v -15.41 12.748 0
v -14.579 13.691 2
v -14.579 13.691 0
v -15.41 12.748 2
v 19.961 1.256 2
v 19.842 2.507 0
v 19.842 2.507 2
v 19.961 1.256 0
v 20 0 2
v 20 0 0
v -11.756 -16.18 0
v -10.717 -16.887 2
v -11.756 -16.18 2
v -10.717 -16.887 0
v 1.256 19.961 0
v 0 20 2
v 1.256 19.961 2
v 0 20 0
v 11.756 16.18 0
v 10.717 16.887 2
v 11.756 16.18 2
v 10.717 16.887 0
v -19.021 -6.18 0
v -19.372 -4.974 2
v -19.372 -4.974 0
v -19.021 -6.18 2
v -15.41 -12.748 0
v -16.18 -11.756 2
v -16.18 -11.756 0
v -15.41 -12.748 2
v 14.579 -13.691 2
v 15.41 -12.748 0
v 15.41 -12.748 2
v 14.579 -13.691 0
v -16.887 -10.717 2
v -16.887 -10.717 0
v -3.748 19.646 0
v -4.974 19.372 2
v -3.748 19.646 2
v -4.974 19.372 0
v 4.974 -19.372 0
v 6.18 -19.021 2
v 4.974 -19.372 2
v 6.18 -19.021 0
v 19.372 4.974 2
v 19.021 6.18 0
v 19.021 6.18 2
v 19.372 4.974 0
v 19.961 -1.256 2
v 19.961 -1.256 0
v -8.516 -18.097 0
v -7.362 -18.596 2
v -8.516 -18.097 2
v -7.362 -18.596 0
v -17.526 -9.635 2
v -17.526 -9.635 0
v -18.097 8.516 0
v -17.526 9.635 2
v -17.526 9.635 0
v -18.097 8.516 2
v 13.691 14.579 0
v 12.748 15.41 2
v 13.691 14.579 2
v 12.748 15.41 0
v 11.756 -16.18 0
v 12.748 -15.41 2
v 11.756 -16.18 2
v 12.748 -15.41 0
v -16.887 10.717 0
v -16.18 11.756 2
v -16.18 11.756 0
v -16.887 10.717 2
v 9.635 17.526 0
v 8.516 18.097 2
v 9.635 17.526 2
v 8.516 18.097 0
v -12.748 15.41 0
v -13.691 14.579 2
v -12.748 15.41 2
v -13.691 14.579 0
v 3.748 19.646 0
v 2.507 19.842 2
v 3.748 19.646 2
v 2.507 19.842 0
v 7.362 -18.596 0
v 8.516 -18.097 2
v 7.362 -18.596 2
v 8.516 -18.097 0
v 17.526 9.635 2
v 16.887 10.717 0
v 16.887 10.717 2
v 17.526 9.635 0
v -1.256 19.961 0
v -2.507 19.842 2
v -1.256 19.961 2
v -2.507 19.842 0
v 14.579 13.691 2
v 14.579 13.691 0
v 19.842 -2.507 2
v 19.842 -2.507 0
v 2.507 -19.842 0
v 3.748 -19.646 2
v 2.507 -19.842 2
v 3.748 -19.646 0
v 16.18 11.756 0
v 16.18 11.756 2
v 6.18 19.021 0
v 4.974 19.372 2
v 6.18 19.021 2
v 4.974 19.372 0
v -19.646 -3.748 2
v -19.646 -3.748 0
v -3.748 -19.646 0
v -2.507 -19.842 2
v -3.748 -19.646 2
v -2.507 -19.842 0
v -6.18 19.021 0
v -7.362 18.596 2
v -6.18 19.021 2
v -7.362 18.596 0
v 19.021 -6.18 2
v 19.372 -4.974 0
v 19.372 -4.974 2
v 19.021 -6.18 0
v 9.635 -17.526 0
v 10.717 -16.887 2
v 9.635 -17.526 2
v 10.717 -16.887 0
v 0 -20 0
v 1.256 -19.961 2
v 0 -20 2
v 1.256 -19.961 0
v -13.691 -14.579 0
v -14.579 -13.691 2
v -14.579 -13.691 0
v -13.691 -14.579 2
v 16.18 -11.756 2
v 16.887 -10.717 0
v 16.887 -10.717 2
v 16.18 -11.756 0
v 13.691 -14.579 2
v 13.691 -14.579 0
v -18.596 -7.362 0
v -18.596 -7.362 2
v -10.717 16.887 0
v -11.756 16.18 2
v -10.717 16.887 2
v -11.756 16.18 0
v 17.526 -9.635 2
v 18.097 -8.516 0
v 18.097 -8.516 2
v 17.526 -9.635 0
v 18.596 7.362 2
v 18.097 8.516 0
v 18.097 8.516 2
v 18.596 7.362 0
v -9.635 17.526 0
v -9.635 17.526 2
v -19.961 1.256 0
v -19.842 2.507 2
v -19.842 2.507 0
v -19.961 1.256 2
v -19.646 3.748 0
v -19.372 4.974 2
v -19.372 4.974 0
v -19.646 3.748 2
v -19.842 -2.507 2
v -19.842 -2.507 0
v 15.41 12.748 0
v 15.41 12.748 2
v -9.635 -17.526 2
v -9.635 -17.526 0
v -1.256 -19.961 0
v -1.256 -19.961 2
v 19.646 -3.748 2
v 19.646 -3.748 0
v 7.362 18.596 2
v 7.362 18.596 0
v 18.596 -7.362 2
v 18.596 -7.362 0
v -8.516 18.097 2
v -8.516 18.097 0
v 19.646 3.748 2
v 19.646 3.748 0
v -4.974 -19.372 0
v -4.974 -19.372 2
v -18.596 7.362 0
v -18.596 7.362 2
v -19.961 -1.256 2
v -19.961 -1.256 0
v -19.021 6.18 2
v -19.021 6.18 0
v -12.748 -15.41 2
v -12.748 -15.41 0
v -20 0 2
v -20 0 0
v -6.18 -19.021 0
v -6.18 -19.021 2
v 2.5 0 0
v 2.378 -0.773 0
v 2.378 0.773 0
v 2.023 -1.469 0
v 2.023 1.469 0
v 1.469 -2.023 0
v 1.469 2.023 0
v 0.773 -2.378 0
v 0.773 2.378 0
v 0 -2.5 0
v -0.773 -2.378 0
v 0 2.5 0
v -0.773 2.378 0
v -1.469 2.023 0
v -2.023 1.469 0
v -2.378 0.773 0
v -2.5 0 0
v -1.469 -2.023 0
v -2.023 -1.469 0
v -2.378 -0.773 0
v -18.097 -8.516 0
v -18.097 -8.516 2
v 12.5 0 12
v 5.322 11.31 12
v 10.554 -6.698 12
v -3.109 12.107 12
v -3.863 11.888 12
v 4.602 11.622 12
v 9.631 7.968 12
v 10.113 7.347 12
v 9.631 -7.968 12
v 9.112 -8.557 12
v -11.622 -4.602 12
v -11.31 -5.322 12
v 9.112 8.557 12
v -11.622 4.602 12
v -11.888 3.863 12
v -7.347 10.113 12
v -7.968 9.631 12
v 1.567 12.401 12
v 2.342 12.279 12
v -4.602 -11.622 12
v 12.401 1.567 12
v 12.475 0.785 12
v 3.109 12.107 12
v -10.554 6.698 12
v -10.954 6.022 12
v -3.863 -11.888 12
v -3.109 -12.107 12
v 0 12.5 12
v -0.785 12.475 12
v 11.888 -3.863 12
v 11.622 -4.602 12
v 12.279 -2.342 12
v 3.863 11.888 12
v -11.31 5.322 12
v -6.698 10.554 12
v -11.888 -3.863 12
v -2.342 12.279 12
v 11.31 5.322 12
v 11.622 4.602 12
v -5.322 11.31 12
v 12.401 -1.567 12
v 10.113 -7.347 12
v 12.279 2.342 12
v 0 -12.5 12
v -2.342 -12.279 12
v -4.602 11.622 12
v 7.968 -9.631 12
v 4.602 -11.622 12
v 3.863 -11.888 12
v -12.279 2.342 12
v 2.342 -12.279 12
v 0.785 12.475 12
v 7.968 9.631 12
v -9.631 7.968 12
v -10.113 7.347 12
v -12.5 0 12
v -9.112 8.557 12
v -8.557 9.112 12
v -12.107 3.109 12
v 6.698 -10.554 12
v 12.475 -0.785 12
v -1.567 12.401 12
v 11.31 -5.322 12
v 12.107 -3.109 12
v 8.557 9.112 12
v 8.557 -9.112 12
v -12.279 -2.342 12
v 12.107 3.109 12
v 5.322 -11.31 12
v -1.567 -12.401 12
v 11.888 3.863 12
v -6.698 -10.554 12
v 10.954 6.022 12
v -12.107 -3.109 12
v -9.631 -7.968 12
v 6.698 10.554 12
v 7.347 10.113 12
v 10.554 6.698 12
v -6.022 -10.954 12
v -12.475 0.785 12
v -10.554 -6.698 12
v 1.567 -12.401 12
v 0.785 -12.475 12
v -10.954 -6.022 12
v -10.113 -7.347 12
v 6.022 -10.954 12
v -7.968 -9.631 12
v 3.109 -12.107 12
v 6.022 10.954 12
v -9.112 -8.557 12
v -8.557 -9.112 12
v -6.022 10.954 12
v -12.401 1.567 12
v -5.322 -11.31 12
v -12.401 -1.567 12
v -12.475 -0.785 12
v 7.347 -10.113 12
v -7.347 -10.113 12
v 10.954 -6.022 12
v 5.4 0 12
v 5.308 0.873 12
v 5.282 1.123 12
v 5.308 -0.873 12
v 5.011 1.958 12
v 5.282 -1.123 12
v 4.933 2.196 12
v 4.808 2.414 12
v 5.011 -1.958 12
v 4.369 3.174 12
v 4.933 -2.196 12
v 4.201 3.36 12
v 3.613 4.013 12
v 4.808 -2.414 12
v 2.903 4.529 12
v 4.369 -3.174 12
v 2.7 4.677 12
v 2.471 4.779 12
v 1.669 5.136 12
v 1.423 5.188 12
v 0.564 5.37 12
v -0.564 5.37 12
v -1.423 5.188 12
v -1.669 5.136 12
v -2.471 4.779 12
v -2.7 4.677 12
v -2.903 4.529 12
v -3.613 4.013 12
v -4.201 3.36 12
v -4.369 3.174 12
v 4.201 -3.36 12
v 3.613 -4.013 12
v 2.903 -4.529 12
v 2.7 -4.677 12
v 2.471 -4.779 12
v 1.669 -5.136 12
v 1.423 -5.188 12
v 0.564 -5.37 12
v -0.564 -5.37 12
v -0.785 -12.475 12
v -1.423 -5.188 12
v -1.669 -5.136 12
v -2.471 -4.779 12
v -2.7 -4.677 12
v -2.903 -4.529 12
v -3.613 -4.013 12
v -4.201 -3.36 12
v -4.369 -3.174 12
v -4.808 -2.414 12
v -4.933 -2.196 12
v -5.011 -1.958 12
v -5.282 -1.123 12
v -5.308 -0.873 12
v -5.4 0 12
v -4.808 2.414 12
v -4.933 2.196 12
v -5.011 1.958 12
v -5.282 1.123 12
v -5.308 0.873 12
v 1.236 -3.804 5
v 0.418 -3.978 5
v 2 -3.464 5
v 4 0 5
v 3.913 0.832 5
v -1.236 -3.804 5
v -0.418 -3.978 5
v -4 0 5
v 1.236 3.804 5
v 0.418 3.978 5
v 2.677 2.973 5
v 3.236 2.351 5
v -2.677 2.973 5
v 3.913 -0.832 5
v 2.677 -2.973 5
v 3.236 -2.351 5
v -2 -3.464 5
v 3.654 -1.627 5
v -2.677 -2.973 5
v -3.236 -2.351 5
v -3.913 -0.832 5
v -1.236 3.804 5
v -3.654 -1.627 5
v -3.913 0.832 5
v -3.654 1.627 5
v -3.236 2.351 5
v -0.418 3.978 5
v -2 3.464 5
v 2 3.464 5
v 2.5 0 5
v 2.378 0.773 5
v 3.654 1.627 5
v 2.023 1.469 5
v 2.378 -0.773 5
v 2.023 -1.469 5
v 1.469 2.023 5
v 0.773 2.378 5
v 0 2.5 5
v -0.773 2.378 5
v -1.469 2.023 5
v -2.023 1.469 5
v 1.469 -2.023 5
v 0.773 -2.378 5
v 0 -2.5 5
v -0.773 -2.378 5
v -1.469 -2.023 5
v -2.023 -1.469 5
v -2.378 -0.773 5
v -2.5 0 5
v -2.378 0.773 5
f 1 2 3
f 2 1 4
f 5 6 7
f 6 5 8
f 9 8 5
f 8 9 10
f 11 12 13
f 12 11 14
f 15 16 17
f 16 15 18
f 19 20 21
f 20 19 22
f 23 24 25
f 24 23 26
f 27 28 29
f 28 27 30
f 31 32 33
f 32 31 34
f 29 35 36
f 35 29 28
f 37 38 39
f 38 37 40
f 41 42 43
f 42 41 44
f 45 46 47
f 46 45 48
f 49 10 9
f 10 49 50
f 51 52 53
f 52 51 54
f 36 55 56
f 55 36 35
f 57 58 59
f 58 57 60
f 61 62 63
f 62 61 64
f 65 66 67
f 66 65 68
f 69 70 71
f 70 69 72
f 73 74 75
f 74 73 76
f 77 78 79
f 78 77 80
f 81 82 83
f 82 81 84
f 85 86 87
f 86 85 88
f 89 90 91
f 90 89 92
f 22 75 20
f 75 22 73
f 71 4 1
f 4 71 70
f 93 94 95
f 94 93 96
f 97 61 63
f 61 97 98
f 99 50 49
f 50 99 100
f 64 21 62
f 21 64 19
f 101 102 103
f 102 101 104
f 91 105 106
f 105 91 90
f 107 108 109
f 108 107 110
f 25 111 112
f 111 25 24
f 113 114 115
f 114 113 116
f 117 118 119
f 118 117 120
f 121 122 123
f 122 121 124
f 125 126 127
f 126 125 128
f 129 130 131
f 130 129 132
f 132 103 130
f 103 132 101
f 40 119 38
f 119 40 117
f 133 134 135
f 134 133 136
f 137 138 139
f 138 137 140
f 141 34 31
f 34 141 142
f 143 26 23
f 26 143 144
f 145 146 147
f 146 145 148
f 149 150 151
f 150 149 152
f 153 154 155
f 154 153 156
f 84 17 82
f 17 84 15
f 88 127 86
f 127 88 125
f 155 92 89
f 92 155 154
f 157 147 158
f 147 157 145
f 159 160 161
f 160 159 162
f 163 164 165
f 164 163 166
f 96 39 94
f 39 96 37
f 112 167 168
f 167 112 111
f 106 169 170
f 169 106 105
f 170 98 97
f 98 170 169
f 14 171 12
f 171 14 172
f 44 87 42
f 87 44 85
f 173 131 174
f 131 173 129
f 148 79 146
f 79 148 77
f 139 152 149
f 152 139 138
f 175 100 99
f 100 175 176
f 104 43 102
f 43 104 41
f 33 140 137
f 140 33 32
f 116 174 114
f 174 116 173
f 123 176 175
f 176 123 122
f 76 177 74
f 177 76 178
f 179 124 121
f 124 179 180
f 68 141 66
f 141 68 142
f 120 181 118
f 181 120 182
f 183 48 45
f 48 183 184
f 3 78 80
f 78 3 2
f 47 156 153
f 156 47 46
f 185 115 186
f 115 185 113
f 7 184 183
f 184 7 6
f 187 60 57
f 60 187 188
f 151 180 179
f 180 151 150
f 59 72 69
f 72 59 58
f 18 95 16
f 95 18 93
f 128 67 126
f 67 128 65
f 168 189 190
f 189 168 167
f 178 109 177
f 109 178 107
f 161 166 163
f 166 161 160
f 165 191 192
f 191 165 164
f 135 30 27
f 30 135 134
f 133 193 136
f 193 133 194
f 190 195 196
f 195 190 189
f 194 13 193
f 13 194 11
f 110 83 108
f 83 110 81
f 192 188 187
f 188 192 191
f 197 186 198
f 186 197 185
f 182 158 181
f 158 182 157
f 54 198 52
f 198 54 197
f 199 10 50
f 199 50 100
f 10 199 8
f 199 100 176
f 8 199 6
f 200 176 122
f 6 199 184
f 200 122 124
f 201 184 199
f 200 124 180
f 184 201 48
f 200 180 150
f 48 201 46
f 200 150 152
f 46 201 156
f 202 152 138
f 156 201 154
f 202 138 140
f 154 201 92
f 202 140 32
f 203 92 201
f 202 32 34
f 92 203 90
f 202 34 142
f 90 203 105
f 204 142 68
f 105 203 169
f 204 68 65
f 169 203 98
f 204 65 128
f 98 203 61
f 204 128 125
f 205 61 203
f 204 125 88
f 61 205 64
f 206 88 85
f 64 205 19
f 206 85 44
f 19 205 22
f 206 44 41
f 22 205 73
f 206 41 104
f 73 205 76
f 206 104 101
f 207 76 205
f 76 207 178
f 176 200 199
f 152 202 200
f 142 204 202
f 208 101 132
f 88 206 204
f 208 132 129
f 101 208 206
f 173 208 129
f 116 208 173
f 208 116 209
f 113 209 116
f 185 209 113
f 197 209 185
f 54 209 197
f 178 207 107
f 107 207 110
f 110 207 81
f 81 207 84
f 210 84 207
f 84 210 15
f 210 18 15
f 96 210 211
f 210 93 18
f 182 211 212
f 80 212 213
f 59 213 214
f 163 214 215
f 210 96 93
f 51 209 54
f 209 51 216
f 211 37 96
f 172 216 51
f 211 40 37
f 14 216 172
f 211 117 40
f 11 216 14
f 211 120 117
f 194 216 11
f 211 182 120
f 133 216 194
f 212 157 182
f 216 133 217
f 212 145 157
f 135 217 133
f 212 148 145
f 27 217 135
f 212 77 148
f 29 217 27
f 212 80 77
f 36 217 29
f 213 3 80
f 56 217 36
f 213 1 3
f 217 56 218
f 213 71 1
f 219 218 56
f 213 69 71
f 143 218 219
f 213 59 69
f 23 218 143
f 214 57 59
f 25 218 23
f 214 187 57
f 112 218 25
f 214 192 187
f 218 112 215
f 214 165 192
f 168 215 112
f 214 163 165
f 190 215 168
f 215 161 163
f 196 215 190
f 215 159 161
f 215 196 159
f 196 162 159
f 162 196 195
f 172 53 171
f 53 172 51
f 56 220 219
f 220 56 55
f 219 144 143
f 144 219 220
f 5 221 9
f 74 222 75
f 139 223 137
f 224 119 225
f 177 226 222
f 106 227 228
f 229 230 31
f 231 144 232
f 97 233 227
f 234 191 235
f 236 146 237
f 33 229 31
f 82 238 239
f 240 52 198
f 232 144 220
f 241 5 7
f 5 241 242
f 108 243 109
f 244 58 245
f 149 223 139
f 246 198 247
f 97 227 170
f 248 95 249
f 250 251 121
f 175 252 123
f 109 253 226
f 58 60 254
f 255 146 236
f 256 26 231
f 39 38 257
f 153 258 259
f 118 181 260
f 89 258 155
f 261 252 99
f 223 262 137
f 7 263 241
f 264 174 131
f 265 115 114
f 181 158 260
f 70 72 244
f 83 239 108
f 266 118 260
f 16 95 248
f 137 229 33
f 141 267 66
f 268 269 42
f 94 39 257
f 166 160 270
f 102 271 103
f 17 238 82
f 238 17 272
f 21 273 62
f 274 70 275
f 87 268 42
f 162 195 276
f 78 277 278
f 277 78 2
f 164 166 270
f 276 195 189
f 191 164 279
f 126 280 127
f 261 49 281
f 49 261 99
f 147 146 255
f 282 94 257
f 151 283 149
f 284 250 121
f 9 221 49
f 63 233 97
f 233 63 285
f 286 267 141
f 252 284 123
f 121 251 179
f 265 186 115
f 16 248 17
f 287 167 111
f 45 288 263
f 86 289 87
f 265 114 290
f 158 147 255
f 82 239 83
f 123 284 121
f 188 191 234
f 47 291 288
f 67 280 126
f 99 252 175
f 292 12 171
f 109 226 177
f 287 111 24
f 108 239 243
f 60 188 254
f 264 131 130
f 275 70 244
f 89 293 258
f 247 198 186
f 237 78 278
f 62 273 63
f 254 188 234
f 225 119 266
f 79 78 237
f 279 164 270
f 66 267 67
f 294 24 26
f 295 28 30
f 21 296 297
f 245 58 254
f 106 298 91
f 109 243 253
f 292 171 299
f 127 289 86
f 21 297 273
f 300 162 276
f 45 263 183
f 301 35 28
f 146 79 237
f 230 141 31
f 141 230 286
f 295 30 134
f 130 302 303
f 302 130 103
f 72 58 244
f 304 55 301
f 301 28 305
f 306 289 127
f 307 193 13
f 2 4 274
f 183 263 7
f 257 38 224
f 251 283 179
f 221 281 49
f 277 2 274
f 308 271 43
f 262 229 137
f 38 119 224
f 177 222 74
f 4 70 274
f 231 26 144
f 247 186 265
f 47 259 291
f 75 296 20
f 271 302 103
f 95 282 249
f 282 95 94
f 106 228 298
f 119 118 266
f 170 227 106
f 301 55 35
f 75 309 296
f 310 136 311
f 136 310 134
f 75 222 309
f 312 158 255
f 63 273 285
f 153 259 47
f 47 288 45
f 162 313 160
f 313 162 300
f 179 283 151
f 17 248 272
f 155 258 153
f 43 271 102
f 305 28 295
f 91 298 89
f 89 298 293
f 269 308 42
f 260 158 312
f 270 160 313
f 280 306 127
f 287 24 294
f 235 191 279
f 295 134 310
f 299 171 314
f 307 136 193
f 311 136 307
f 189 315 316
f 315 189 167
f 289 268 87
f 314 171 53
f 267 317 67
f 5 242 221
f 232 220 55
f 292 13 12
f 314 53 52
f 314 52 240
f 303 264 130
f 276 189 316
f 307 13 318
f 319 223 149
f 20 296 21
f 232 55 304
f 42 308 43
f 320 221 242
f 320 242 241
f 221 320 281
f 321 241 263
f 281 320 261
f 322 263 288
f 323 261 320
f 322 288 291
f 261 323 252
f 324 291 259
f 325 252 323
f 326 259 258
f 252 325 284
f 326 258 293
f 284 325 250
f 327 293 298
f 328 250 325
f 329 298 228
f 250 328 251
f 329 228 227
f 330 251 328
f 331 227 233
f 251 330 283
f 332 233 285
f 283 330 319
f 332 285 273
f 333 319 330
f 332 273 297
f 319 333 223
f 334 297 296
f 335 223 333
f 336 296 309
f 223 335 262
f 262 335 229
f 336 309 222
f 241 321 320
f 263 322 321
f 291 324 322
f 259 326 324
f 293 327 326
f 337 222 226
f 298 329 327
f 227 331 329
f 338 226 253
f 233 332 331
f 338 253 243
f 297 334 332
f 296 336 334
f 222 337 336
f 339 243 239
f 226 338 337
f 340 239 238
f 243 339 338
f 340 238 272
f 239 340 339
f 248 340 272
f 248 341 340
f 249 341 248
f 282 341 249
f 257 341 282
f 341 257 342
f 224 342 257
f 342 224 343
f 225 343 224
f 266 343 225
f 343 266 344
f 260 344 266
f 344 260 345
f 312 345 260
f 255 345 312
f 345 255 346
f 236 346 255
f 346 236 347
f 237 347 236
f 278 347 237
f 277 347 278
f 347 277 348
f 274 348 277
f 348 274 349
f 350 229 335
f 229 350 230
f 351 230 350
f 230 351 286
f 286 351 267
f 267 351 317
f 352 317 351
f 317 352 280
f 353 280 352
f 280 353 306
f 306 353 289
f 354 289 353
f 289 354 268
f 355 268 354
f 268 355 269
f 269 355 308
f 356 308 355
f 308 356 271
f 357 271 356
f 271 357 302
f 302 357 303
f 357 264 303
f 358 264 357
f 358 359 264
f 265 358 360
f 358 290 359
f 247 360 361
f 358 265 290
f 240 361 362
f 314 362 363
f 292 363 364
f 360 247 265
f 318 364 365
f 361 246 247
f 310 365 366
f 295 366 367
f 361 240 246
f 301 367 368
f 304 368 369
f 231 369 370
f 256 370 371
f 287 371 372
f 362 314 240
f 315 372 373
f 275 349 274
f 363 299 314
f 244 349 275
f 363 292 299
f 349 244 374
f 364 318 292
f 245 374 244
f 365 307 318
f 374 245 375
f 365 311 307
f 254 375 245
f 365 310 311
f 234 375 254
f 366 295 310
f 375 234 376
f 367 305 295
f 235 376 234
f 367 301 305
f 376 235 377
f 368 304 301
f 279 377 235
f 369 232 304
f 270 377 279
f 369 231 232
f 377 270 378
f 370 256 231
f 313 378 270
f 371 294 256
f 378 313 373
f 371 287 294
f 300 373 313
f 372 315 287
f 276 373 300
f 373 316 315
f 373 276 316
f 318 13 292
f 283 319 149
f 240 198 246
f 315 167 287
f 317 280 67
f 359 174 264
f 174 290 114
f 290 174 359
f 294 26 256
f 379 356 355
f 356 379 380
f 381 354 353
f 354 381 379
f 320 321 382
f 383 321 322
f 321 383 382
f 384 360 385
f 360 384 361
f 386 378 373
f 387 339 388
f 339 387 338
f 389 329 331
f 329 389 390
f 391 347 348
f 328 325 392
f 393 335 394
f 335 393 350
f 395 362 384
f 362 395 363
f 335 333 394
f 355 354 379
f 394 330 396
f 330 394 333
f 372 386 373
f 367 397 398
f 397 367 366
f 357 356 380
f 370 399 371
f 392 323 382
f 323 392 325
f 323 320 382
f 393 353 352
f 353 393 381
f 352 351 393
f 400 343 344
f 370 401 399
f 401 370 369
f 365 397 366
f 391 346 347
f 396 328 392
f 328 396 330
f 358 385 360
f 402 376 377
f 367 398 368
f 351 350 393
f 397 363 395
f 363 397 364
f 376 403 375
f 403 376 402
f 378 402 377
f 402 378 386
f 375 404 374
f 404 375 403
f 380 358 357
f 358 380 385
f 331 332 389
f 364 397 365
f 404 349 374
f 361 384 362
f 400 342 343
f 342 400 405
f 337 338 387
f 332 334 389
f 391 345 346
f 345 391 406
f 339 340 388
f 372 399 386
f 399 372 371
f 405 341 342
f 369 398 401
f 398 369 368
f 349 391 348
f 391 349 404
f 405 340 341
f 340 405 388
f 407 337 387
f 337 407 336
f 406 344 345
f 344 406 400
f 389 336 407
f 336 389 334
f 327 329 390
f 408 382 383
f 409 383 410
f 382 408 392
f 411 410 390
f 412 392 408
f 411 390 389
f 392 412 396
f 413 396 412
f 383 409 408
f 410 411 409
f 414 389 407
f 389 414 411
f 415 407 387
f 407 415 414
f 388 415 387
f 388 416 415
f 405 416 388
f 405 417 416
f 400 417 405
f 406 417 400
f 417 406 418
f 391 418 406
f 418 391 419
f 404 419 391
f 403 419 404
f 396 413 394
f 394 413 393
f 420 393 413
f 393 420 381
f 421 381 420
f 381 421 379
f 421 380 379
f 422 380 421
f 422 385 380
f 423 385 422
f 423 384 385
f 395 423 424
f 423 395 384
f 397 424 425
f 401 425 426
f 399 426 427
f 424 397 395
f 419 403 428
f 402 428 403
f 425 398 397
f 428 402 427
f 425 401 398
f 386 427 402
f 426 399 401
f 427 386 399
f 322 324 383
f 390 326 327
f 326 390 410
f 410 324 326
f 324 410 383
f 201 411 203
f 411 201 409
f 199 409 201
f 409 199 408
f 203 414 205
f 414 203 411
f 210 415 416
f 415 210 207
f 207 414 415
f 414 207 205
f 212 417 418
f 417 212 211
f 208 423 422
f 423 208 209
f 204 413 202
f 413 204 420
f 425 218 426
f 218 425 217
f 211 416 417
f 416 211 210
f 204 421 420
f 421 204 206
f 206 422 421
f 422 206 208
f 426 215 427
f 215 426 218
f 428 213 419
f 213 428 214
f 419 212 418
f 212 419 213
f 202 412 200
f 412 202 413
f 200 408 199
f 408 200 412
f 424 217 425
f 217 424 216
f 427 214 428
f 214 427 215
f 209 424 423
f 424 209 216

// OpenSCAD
difference(){
  union(){
    cylinder(d=40,h=2,$fn=100);
    translate([0,0,2]) cylinder(d1=40,d2=25,h=10,$fn=100);
  }
  translate([0,0,5]) cylinder(d1=8,d2=12,h=10,$fn=30);
  translate([0,0,-.01]) cylinder(d=5,h=30,$fn=20);
}
